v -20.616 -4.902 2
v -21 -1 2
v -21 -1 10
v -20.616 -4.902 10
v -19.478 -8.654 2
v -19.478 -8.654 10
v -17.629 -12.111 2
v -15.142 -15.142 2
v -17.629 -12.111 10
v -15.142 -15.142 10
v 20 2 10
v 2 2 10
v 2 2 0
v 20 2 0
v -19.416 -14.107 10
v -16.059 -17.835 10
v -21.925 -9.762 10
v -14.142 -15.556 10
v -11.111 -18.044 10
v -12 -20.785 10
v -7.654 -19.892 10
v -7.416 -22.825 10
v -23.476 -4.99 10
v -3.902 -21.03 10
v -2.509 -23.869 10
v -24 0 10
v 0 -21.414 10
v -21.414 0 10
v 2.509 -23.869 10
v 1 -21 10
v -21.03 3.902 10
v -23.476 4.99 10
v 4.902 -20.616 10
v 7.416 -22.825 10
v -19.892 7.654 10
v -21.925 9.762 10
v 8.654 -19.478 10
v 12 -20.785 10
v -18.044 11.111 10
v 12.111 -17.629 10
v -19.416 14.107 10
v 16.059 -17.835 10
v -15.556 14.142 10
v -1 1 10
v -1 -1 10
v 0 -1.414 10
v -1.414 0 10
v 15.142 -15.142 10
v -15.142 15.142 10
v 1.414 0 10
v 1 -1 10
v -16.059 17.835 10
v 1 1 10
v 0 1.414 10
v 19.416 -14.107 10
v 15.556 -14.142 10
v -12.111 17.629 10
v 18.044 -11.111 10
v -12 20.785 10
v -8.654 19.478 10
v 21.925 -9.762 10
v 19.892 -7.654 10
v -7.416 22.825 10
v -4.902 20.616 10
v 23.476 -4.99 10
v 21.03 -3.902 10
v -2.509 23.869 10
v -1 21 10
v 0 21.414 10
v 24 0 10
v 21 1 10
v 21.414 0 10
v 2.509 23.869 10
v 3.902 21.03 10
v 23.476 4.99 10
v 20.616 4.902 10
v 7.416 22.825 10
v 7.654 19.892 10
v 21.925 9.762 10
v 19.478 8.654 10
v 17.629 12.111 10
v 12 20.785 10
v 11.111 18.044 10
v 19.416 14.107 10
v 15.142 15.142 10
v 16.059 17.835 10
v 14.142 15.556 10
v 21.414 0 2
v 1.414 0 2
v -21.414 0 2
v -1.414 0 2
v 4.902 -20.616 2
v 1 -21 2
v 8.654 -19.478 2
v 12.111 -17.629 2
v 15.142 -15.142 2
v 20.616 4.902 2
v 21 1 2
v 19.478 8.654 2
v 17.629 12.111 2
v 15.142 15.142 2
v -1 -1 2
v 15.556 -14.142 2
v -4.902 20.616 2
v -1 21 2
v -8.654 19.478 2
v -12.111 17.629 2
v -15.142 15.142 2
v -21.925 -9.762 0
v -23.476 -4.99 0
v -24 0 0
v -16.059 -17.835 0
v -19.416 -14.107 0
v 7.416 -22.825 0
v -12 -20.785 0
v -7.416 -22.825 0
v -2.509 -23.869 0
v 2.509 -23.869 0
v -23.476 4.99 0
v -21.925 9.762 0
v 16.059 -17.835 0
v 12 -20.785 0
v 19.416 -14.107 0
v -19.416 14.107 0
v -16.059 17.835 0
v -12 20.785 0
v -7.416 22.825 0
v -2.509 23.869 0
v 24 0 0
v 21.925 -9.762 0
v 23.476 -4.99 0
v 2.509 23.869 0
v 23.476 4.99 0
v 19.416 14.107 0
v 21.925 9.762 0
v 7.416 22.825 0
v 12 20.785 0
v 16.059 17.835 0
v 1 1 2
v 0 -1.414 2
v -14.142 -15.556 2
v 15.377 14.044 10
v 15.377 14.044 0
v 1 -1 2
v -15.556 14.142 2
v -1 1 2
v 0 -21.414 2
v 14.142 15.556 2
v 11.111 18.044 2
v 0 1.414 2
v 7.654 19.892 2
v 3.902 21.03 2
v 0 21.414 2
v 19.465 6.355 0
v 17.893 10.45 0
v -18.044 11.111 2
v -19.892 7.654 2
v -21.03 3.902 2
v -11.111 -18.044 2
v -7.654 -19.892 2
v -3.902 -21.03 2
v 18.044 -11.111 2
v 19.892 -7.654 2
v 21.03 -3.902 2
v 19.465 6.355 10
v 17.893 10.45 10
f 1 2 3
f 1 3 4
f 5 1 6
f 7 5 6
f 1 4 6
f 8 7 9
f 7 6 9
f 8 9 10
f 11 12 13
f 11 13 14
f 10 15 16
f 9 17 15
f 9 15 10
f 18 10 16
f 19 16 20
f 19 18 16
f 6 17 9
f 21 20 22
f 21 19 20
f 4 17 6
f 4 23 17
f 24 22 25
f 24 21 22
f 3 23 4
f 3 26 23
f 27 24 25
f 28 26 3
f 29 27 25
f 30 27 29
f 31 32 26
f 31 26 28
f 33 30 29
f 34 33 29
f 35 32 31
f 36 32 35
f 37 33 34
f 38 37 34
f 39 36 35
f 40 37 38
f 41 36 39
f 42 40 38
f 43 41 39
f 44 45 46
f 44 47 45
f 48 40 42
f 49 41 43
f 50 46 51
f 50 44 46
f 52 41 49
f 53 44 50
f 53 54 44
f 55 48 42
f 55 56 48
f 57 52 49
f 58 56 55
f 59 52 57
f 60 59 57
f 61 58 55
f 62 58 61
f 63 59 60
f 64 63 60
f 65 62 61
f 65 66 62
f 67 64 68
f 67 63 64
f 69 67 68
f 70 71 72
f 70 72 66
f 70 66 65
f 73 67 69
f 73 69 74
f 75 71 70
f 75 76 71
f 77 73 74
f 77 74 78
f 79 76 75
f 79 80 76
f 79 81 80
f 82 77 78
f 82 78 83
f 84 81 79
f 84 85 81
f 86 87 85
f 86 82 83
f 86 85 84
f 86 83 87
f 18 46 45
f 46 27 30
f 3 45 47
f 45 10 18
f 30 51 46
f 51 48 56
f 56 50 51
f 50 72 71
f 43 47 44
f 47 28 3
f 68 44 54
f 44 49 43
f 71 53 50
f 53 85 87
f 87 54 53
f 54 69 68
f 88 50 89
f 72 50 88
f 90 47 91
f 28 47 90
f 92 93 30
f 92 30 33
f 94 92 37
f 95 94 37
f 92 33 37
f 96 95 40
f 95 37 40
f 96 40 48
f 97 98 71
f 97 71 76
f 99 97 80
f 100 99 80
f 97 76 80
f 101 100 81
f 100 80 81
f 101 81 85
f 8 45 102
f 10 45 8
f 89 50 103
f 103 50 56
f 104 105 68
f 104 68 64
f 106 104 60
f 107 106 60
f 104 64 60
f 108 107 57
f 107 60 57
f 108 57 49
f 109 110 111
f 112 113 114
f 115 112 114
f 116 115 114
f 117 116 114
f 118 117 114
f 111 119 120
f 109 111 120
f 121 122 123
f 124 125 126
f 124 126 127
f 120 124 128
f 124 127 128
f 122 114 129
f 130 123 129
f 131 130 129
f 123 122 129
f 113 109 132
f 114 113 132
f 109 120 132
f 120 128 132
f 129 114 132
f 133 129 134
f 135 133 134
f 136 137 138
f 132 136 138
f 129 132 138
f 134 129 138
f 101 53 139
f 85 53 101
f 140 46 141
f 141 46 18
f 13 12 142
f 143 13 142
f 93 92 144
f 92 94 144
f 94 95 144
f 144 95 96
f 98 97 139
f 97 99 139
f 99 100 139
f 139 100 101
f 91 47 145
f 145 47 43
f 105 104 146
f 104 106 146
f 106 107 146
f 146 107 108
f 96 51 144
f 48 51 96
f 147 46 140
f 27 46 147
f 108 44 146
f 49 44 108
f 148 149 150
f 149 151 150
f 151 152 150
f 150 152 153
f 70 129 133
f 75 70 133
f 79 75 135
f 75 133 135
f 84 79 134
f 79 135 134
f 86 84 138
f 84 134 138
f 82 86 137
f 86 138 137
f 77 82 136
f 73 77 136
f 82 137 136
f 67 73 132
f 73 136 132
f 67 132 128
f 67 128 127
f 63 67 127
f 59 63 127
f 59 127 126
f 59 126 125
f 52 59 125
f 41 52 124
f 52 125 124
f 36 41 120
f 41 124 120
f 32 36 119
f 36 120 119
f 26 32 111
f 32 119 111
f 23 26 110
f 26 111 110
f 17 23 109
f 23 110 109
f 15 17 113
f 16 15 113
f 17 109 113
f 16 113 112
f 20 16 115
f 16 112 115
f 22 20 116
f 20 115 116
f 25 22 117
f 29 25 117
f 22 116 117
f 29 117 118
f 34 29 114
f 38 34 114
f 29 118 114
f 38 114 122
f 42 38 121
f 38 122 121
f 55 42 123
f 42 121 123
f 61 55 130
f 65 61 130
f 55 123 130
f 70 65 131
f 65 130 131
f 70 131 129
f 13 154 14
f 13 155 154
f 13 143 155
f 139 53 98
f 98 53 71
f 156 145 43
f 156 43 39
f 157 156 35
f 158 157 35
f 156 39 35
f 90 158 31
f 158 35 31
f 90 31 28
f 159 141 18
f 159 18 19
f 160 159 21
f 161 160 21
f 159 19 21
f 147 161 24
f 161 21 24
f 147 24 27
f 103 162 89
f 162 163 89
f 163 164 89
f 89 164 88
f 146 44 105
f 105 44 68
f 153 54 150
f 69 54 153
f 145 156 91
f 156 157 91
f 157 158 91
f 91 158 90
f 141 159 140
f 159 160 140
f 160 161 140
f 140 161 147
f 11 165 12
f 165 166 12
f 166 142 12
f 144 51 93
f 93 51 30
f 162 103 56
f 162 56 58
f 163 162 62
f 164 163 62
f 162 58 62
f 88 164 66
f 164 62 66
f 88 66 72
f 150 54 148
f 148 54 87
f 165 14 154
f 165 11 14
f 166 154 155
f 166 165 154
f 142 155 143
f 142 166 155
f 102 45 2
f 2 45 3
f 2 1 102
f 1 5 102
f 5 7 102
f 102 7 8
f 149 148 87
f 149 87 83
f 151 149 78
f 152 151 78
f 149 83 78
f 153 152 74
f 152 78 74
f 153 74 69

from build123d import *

# Parameters (mm, degrees)
CYLINDER001_W     = 20
CYLINDER001_H     = 8
CYLINDER001_ANGLE = 45
ARRAY_COUNT       = 8
CYLINDER_R        = 24
CYLINDER_DEPTH    = 10
CYLINDER002_W     = 18
CYLINDER002_H     = 10
CYLINDER002_ANGLE = 42


with BuildPart() as array:
    # Cylinder001 → Cylinder001 (revolve)
    with BuildSketch(Plane(origin=(1, 1, 2), x_dir=(1, 0, 0), z_dir=(0, -1, 0))):
        with Locations((10, 4)):
            Rectangle(CYLINDER001_W, CYLINDER001_H)
    revolve(axis=Axis((1, 1, 2), (0, 0, 1)), revolution_arc=CYLINDER001_ANGLE)

    # Array: Array ×8 about axis
    array_axis = Axis((0, 0, 0), (0, 0, 1))


with BuildPart() as array_1:
    add(array.part)
    for i in range(1, ARRAY_COUNT):
        add(array.part.rotate(array_axis, i * 360 / ARRAY_COUNT))


with BuildPart() as cut:
    # Cylinder → Cylinder (new body)
    with BuildSketch(Plane.XY):
        Circle(CYLINDER_R)
    extrude(amount=CYLINDER_DEPTH)

    # Cut: cut Array
    add(array_1.part, mode=Mode.SUBTRACT)


with BuildPart() as cilindro002:
    # Cylinder002 → Cylinder002 (revolve)
    with BuildSketch(Plane(origin=(2, 2, 0), x_dir=(1, 0, 0), z_dir=(0, -1, 0))):
        with Locations((9, 5)):
            Rectangle(CYLINDER002_W, CYLINDER002_H)
    revolve(axis=Axis((2, 2, 0), (0, 0, 1)), revolution_arc=CYLINDER002_ANGLE)


solid = Compound([cut.part, cilindro002.part])
